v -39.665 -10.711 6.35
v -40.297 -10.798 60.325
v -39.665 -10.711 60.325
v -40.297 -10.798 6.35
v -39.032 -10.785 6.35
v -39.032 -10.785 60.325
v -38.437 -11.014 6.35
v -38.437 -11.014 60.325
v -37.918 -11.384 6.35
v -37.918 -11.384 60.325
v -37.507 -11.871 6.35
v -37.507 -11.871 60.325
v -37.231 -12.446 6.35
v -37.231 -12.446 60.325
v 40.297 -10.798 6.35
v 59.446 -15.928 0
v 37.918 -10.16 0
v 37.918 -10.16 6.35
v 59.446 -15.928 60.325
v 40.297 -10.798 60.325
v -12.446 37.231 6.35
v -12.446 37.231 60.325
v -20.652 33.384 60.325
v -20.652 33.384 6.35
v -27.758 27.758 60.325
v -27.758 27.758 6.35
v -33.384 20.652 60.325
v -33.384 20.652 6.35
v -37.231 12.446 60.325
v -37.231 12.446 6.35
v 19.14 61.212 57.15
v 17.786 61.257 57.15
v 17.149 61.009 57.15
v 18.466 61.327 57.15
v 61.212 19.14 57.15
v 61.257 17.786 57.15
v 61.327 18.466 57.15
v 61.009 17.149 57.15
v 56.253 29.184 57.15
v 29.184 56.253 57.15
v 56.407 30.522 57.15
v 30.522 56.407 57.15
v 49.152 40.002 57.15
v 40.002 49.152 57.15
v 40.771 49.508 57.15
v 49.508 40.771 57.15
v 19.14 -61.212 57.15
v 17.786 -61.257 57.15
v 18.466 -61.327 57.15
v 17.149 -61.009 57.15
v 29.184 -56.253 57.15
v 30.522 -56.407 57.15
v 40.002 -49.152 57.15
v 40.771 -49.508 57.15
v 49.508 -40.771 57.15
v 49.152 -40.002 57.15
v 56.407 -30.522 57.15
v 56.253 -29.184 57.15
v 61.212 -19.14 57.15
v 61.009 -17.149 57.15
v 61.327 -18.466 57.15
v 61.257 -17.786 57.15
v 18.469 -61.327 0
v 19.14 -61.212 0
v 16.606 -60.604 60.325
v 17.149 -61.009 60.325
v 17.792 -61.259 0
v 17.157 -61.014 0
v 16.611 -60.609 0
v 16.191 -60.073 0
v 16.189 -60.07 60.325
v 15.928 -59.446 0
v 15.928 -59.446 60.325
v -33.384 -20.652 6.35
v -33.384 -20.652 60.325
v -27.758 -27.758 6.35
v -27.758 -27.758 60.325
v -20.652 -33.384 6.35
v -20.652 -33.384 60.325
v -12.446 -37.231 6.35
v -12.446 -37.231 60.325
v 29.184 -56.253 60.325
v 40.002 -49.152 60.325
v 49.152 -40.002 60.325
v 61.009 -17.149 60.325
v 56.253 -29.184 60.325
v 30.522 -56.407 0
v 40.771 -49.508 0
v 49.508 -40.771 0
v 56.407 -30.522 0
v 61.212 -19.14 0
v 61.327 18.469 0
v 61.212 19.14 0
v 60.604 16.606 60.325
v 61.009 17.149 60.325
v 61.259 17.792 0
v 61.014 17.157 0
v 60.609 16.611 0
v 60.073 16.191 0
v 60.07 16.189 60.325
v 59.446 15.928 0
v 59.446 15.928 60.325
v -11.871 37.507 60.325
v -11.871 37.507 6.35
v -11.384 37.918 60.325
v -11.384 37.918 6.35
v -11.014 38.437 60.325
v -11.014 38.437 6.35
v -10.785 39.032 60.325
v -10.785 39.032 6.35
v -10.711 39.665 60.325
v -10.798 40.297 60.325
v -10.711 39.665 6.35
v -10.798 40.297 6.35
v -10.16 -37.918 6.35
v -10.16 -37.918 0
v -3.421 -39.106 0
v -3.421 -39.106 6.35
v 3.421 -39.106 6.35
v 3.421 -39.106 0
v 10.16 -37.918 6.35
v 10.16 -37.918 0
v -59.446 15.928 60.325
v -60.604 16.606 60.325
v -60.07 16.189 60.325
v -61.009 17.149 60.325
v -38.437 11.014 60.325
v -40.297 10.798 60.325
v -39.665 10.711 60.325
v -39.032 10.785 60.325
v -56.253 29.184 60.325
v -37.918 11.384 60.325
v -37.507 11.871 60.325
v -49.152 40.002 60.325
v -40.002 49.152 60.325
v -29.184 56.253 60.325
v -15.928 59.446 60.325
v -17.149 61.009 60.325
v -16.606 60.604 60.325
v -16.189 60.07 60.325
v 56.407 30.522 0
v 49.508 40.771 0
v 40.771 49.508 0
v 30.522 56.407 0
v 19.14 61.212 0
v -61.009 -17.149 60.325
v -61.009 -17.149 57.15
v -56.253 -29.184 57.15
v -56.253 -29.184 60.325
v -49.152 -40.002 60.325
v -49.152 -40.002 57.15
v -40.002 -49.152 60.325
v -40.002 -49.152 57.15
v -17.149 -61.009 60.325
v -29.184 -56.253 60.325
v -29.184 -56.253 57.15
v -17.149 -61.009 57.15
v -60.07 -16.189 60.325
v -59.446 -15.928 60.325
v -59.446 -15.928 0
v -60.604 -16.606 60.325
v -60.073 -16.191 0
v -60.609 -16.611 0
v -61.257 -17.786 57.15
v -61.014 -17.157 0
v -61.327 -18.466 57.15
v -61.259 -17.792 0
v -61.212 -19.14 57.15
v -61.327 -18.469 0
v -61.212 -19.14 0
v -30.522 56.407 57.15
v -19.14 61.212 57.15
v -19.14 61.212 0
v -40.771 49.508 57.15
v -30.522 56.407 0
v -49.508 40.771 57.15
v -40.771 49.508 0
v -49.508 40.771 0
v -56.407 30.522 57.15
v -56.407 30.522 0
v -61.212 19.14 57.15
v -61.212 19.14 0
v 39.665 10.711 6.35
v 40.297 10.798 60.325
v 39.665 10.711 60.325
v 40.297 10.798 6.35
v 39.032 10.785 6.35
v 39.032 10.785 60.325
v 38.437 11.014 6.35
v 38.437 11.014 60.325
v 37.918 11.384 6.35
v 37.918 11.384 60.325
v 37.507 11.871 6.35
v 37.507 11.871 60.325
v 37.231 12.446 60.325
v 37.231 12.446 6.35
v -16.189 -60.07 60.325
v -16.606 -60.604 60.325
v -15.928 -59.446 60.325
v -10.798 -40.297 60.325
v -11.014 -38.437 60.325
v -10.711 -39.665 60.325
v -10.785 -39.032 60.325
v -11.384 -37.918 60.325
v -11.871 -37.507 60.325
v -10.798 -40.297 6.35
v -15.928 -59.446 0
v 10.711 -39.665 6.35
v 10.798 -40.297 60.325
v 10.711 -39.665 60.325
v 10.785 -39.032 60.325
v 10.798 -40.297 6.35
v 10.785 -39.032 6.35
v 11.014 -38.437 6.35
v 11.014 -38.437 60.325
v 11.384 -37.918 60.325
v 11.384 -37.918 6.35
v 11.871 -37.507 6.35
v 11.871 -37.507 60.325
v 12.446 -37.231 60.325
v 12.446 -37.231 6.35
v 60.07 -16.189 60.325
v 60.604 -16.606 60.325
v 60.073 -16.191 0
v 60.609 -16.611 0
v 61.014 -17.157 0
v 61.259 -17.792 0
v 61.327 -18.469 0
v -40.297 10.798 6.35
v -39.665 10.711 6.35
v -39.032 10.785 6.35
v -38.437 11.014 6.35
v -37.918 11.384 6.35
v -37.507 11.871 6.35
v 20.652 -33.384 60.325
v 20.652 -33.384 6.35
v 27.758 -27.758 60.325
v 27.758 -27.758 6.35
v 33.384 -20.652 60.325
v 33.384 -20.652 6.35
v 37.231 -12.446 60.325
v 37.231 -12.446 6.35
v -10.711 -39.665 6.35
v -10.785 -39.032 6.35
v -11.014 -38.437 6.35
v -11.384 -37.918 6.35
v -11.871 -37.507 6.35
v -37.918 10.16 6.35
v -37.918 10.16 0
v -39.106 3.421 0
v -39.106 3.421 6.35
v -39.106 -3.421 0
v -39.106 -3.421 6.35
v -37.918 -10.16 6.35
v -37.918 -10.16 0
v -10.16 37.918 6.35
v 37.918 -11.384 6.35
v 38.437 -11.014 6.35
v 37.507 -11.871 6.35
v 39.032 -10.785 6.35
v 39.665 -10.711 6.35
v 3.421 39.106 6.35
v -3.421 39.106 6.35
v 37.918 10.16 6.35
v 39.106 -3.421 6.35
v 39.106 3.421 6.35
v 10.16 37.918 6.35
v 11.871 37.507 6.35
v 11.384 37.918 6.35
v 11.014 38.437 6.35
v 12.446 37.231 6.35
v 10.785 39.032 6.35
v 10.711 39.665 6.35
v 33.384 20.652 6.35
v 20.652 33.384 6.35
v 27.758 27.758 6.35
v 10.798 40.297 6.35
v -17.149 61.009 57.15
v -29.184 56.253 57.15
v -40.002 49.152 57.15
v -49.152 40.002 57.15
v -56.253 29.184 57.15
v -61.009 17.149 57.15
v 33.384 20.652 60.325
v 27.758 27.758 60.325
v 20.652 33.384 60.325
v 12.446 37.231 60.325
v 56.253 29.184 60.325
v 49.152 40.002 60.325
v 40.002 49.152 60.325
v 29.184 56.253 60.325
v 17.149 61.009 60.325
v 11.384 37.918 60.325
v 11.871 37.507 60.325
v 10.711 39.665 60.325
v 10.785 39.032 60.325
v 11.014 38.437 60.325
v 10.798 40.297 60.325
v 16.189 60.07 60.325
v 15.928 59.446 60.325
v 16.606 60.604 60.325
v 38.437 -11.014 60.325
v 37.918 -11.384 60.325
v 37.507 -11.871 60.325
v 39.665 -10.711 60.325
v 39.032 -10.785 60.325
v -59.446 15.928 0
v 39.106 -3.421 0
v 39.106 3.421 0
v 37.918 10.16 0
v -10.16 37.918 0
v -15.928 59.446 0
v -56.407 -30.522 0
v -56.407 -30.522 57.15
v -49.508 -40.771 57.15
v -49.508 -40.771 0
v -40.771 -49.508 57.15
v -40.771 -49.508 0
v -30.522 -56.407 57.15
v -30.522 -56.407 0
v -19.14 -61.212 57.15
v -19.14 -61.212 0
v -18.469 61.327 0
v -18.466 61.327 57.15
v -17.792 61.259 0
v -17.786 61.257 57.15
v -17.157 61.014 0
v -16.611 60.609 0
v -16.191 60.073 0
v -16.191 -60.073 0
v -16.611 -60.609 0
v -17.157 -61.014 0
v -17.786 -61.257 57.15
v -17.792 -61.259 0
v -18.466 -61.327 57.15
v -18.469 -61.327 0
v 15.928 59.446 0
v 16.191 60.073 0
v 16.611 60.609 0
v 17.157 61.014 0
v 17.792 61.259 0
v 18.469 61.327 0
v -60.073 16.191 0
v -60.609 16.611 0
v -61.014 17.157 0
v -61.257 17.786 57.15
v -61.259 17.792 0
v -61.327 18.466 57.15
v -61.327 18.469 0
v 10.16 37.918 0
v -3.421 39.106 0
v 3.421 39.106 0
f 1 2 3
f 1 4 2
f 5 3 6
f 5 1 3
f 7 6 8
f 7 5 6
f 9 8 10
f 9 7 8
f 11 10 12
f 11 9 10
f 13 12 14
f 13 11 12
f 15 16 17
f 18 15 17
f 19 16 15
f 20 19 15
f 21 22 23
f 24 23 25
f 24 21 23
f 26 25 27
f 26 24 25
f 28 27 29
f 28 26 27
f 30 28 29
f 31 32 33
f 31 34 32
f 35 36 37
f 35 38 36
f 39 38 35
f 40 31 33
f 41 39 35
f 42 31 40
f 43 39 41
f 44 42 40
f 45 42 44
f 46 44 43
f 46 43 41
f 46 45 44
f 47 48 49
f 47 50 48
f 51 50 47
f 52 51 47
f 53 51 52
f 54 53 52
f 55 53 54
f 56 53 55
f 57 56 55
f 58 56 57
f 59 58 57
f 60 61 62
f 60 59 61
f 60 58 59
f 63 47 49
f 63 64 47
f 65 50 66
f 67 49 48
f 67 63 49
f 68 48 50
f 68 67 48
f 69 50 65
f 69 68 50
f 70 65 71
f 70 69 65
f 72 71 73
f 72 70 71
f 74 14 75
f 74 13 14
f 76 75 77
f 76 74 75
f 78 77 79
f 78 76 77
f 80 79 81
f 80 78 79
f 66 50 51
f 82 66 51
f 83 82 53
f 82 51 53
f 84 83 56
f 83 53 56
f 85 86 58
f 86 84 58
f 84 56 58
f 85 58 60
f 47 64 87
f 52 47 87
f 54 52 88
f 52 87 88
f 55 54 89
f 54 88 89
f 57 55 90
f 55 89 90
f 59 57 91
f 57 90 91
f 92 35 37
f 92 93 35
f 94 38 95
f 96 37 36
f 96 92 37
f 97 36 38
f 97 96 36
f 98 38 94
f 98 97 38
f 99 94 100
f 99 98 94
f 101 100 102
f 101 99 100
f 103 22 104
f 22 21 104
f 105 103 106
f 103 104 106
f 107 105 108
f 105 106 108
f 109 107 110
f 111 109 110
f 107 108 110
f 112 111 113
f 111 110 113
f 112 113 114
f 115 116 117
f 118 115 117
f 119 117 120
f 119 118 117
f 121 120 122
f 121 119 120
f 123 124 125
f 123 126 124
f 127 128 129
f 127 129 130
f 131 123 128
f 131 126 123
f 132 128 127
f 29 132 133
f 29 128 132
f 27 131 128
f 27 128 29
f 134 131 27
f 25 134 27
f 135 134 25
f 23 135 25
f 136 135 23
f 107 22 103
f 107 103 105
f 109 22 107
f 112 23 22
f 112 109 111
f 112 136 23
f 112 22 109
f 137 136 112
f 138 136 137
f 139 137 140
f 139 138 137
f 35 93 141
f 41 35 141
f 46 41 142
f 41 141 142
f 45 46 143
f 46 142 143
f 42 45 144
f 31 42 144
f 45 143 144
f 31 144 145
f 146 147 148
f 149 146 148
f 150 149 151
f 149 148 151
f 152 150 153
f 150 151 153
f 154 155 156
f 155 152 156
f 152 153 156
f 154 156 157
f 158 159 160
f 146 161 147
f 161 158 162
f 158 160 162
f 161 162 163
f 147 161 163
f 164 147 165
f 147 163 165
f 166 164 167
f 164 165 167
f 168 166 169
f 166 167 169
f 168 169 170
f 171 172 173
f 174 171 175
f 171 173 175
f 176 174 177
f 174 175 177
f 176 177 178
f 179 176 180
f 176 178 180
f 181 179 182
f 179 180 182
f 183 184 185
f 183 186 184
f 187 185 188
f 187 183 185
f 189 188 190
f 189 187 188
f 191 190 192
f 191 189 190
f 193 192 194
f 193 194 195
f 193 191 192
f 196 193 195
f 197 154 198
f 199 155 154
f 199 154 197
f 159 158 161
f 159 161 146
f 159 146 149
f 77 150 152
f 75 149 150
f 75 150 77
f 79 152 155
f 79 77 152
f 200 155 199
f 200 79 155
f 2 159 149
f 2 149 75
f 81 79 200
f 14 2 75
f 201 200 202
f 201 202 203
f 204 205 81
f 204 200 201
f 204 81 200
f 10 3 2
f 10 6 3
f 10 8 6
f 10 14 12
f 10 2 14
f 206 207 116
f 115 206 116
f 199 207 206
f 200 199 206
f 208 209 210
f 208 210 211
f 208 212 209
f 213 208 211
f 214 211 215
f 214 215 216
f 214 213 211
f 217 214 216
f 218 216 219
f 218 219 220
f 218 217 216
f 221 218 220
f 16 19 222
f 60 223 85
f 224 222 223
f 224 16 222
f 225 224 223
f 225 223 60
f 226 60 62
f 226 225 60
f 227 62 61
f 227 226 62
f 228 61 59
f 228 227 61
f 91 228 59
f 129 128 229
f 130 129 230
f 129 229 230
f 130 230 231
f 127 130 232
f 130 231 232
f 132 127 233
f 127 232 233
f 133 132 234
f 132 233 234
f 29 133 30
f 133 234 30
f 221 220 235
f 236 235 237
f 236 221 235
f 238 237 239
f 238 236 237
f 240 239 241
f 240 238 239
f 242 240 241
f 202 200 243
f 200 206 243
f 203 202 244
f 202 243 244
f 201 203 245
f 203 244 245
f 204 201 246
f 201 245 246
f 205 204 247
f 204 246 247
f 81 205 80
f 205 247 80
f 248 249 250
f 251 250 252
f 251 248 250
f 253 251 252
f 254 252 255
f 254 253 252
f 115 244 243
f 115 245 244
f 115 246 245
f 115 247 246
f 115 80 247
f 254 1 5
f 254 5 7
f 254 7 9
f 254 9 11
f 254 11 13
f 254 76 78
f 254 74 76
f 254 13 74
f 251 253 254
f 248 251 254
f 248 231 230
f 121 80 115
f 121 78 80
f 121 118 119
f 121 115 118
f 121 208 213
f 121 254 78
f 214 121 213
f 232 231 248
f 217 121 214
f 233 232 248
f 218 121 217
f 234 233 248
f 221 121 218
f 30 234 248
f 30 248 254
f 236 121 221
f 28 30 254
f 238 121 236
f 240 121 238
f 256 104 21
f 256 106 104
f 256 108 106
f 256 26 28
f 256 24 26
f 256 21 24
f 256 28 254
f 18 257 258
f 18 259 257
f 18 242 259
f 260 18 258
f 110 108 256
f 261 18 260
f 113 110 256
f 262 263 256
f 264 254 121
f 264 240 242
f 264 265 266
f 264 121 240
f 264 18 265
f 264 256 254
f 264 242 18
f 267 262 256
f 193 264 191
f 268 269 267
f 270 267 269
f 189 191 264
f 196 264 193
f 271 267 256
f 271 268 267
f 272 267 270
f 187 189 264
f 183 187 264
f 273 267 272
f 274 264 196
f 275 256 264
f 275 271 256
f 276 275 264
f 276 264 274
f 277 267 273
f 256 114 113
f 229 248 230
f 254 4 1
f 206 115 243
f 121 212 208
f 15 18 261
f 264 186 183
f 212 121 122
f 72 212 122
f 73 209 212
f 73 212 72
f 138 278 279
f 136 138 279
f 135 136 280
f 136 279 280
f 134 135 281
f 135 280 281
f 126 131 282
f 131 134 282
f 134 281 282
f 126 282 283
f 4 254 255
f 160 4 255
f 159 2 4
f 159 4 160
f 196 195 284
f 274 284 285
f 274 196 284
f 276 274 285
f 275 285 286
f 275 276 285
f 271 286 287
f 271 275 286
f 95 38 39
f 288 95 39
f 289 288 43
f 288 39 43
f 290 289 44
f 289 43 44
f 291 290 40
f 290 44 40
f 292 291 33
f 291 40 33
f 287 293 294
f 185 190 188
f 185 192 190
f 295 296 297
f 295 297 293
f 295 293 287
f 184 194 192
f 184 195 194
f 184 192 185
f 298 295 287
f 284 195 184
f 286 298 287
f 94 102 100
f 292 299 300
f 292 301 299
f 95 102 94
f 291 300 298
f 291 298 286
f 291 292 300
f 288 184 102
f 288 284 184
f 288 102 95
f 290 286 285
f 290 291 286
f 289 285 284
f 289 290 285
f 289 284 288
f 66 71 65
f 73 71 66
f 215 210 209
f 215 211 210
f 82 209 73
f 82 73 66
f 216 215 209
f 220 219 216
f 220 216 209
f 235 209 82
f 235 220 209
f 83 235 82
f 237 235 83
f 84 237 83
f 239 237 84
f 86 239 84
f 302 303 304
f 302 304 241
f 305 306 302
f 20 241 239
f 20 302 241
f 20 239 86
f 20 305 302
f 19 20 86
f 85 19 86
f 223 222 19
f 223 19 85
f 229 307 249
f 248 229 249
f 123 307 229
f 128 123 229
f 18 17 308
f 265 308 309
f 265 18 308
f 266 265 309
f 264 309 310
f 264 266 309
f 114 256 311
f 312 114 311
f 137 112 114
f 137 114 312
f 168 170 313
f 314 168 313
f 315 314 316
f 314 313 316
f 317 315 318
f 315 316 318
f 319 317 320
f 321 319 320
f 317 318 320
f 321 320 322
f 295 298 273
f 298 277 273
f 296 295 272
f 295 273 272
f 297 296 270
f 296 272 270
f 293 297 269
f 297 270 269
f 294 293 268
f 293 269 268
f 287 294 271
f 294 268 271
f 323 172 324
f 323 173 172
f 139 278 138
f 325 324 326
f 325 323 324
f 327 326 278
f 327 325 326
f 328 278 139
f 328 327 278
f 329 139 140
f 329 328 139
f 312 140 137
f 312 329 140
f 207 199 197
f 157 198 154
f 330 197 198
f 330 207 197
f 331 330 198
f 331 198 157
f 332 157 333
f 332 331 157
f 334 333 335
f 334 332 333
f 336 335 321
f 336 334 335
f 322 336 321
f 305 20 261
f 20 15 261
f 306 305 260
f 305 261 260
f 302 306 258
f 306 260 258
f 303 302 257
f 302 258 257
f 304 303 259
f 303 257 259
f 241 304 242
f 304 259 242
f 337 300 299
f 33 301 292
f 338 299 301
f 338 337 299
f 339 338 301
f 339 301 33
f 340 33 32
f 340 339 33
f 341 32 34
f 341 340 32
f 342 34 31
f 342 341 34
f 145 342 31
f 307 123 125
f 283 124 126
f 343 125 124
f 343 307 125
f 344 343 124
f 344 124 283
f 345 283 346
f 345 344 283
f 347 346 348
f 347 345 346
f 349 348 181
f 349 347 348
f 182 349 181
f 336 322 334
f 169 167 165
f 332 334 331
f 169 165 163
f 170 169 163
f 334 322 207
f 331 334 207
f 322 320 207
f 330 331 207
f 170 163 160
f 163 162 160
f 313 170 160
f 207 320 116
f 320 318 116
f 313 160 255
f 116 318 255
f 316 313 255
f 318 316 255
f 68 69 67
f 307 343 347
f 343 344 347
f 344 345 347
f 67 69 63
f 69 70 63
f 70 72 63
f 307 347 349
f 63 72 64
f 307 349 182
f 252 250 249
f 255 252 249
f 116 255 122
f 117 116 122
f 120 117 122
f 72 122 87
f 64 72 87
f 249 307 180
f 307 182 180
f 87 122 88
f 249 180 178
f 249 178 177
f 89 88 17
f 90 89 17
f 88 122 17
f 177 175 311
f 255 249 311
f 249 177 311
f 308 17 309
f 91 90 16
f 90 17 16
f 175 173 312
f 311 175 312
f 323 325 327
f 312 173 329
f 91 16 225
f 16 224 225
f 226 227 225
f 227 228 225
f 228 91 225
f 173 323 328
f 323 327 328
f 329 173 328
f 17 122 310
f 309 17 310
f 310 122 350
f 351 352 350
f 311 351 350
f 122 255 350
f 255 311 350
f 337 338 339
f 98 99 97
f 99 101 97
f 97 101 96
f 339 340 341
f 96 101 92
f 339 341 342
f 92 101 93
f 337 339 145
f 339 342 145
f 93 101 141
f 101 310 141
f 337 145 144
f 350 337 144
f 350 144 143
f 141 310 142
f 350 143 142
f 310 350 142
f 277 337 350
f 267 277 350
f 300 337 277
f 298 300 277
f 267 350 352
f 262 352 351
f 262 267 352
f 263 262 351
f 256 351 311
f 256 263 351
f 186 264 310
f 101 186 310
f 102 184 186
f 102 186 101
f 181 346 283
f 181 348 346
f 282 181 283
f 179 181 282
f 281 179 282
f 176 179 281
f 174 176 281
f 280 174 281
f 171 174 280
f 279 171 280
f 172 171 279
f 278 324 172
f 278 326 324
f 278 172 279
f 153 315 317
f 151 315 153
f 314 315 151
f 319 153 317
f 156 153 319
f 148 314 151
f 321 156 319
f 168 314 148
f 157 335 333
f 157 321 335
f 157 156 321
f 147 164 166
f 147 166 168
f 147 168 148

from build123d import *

# Parameters (mm, degrees)
SKETCH2_R                = 64.135
BOSS_EXTRUDE1_DEPTH      = 6.35
SKETCH3_R                = 64.135
SKETCH3_R_2              = 39.2557
BOSS_EXTRUDE2_DEPTH      = 50.8
SKETCH4_R                = 63.373
SKETCH4_R_2              = 39.2557
BOSS_EXTRUDE3_DEPTH      = 3.175
CUT_EXTRUDE1_DEPTH       = 61.325
FILLET1_R                = 2.54
CIRPATTERN1_COUNT        = 4
FILLET1_OF_CIRPATTERN1_R = 2.54


with BuildPart() as part:
    # Sketch2 → Boss-Extrude1 (new body)
    with BuildSketch(Plane.XY):
        Circle(SKETCH2_R)
    extrude(amount=BOSS_EXTRUDE1_DEPTH)

    # Sketch3 → Boss-Extrude2 (add)
    with BuildSketch(Plane.XY.offset(6.35)):
        Circle(SKETCH3_R)
        Circle(SKETCH3_R_2, mode=Mode.SUBTRACT)
    extrude(amount=BOSS_EXTRUDE2_DEPTH)

    # Sketch4 → Boss-Extrude3 (add)
    with BuildSketch(Plane.XY.offset(57.15)):
        Circle(SKETCH4_R)
        Circle(SKETCH4_R_2, mode=Mode.SUBTRACT)
    extrude(amount=BOSS_EXTRUDE3_DEPTH)

    # Sketch5 → Cut-Extrude1 (cut, through all)
    with BuildSketch(Plane.XY.offset(60.325)):
        with BuildLine():
            Line((-10.160122789, 37.918094459), (-16.599359458, 61.949652869))
            ThreePointArc((-16.599359458, 61.949652869), (0, 64.135), (16.599359458, 61.949652869))
            Line((16.599359458, 61.949652869), (10.160122789, 37.918094459))
            ThreePointArc((10.160122789, 37.918094459), (0, 39.2557), (-10.160122789, 37.918094459))
        make_face()
    cut_extrude1 = extrude(amount=-CUT_EXTRUDE1_DEPTH, mode=Mode.SUBTRACT)

    # Fillet1
    fillet1_edges = [part.edges().sort_by_distance(p)[0] for p in [
        (16.599359458, 61.949652869, 28.575),
        (10.160122789, 37.918094459, 33.3375),
        (-10.160122789, 37.918094459, 33.3375),
        (-16.599359458, 61.949652869, 28.575),
    ]]
    fillet(fillet1_edges, radius=FILLET1_R)

    # CirPattern1: Cut-Extrude1 ×4 about axis
    cirpattern1_axis = Axis((0, 0, 0), (0, 0, 1))
    for i in range(1, CIRPATTERN1_COUNT):
        add(cut_extrude1.rotate(cirpattern1_axis, i * 360 / CIRPATTERN1_COUNT), mode=Mode.SUBTRACT)

    # Fillet1 of CirPattern1
    fillet1_of_cirpattern1_edges = [part.edges().sort_by_distance(p)[0] for p in [
        (-61.949652869, 16.599359458, 28.575),
        (-37.918094459, 10.160122789, 33.3375),
        (-37.918094459, -10.160122789, 33.3375),
        (-61.949652869, -16.599359458, 28.575),
        (-16.599359458, -61.949652869, 28.575),
        (-10.160122789, -37.918094459, 33.3375),
        (10.160122789, -37.918094459, 33.3375),
        (16.599359458, -61.949652869, 28.575),
        (61.949652869, -16.599359458, 28.575),
        (37.918094459, -10.160122789, 33.3375),
        (37.918094459, 10.160122789, 33.3375),
        (61.949652869, 16.599359458, 28.575),
    ]]
    fillet(fillet1_of_cirpattern1_edges, radius=FILLET1_OF_CIRPATTERN1_R)


solid = part.part
